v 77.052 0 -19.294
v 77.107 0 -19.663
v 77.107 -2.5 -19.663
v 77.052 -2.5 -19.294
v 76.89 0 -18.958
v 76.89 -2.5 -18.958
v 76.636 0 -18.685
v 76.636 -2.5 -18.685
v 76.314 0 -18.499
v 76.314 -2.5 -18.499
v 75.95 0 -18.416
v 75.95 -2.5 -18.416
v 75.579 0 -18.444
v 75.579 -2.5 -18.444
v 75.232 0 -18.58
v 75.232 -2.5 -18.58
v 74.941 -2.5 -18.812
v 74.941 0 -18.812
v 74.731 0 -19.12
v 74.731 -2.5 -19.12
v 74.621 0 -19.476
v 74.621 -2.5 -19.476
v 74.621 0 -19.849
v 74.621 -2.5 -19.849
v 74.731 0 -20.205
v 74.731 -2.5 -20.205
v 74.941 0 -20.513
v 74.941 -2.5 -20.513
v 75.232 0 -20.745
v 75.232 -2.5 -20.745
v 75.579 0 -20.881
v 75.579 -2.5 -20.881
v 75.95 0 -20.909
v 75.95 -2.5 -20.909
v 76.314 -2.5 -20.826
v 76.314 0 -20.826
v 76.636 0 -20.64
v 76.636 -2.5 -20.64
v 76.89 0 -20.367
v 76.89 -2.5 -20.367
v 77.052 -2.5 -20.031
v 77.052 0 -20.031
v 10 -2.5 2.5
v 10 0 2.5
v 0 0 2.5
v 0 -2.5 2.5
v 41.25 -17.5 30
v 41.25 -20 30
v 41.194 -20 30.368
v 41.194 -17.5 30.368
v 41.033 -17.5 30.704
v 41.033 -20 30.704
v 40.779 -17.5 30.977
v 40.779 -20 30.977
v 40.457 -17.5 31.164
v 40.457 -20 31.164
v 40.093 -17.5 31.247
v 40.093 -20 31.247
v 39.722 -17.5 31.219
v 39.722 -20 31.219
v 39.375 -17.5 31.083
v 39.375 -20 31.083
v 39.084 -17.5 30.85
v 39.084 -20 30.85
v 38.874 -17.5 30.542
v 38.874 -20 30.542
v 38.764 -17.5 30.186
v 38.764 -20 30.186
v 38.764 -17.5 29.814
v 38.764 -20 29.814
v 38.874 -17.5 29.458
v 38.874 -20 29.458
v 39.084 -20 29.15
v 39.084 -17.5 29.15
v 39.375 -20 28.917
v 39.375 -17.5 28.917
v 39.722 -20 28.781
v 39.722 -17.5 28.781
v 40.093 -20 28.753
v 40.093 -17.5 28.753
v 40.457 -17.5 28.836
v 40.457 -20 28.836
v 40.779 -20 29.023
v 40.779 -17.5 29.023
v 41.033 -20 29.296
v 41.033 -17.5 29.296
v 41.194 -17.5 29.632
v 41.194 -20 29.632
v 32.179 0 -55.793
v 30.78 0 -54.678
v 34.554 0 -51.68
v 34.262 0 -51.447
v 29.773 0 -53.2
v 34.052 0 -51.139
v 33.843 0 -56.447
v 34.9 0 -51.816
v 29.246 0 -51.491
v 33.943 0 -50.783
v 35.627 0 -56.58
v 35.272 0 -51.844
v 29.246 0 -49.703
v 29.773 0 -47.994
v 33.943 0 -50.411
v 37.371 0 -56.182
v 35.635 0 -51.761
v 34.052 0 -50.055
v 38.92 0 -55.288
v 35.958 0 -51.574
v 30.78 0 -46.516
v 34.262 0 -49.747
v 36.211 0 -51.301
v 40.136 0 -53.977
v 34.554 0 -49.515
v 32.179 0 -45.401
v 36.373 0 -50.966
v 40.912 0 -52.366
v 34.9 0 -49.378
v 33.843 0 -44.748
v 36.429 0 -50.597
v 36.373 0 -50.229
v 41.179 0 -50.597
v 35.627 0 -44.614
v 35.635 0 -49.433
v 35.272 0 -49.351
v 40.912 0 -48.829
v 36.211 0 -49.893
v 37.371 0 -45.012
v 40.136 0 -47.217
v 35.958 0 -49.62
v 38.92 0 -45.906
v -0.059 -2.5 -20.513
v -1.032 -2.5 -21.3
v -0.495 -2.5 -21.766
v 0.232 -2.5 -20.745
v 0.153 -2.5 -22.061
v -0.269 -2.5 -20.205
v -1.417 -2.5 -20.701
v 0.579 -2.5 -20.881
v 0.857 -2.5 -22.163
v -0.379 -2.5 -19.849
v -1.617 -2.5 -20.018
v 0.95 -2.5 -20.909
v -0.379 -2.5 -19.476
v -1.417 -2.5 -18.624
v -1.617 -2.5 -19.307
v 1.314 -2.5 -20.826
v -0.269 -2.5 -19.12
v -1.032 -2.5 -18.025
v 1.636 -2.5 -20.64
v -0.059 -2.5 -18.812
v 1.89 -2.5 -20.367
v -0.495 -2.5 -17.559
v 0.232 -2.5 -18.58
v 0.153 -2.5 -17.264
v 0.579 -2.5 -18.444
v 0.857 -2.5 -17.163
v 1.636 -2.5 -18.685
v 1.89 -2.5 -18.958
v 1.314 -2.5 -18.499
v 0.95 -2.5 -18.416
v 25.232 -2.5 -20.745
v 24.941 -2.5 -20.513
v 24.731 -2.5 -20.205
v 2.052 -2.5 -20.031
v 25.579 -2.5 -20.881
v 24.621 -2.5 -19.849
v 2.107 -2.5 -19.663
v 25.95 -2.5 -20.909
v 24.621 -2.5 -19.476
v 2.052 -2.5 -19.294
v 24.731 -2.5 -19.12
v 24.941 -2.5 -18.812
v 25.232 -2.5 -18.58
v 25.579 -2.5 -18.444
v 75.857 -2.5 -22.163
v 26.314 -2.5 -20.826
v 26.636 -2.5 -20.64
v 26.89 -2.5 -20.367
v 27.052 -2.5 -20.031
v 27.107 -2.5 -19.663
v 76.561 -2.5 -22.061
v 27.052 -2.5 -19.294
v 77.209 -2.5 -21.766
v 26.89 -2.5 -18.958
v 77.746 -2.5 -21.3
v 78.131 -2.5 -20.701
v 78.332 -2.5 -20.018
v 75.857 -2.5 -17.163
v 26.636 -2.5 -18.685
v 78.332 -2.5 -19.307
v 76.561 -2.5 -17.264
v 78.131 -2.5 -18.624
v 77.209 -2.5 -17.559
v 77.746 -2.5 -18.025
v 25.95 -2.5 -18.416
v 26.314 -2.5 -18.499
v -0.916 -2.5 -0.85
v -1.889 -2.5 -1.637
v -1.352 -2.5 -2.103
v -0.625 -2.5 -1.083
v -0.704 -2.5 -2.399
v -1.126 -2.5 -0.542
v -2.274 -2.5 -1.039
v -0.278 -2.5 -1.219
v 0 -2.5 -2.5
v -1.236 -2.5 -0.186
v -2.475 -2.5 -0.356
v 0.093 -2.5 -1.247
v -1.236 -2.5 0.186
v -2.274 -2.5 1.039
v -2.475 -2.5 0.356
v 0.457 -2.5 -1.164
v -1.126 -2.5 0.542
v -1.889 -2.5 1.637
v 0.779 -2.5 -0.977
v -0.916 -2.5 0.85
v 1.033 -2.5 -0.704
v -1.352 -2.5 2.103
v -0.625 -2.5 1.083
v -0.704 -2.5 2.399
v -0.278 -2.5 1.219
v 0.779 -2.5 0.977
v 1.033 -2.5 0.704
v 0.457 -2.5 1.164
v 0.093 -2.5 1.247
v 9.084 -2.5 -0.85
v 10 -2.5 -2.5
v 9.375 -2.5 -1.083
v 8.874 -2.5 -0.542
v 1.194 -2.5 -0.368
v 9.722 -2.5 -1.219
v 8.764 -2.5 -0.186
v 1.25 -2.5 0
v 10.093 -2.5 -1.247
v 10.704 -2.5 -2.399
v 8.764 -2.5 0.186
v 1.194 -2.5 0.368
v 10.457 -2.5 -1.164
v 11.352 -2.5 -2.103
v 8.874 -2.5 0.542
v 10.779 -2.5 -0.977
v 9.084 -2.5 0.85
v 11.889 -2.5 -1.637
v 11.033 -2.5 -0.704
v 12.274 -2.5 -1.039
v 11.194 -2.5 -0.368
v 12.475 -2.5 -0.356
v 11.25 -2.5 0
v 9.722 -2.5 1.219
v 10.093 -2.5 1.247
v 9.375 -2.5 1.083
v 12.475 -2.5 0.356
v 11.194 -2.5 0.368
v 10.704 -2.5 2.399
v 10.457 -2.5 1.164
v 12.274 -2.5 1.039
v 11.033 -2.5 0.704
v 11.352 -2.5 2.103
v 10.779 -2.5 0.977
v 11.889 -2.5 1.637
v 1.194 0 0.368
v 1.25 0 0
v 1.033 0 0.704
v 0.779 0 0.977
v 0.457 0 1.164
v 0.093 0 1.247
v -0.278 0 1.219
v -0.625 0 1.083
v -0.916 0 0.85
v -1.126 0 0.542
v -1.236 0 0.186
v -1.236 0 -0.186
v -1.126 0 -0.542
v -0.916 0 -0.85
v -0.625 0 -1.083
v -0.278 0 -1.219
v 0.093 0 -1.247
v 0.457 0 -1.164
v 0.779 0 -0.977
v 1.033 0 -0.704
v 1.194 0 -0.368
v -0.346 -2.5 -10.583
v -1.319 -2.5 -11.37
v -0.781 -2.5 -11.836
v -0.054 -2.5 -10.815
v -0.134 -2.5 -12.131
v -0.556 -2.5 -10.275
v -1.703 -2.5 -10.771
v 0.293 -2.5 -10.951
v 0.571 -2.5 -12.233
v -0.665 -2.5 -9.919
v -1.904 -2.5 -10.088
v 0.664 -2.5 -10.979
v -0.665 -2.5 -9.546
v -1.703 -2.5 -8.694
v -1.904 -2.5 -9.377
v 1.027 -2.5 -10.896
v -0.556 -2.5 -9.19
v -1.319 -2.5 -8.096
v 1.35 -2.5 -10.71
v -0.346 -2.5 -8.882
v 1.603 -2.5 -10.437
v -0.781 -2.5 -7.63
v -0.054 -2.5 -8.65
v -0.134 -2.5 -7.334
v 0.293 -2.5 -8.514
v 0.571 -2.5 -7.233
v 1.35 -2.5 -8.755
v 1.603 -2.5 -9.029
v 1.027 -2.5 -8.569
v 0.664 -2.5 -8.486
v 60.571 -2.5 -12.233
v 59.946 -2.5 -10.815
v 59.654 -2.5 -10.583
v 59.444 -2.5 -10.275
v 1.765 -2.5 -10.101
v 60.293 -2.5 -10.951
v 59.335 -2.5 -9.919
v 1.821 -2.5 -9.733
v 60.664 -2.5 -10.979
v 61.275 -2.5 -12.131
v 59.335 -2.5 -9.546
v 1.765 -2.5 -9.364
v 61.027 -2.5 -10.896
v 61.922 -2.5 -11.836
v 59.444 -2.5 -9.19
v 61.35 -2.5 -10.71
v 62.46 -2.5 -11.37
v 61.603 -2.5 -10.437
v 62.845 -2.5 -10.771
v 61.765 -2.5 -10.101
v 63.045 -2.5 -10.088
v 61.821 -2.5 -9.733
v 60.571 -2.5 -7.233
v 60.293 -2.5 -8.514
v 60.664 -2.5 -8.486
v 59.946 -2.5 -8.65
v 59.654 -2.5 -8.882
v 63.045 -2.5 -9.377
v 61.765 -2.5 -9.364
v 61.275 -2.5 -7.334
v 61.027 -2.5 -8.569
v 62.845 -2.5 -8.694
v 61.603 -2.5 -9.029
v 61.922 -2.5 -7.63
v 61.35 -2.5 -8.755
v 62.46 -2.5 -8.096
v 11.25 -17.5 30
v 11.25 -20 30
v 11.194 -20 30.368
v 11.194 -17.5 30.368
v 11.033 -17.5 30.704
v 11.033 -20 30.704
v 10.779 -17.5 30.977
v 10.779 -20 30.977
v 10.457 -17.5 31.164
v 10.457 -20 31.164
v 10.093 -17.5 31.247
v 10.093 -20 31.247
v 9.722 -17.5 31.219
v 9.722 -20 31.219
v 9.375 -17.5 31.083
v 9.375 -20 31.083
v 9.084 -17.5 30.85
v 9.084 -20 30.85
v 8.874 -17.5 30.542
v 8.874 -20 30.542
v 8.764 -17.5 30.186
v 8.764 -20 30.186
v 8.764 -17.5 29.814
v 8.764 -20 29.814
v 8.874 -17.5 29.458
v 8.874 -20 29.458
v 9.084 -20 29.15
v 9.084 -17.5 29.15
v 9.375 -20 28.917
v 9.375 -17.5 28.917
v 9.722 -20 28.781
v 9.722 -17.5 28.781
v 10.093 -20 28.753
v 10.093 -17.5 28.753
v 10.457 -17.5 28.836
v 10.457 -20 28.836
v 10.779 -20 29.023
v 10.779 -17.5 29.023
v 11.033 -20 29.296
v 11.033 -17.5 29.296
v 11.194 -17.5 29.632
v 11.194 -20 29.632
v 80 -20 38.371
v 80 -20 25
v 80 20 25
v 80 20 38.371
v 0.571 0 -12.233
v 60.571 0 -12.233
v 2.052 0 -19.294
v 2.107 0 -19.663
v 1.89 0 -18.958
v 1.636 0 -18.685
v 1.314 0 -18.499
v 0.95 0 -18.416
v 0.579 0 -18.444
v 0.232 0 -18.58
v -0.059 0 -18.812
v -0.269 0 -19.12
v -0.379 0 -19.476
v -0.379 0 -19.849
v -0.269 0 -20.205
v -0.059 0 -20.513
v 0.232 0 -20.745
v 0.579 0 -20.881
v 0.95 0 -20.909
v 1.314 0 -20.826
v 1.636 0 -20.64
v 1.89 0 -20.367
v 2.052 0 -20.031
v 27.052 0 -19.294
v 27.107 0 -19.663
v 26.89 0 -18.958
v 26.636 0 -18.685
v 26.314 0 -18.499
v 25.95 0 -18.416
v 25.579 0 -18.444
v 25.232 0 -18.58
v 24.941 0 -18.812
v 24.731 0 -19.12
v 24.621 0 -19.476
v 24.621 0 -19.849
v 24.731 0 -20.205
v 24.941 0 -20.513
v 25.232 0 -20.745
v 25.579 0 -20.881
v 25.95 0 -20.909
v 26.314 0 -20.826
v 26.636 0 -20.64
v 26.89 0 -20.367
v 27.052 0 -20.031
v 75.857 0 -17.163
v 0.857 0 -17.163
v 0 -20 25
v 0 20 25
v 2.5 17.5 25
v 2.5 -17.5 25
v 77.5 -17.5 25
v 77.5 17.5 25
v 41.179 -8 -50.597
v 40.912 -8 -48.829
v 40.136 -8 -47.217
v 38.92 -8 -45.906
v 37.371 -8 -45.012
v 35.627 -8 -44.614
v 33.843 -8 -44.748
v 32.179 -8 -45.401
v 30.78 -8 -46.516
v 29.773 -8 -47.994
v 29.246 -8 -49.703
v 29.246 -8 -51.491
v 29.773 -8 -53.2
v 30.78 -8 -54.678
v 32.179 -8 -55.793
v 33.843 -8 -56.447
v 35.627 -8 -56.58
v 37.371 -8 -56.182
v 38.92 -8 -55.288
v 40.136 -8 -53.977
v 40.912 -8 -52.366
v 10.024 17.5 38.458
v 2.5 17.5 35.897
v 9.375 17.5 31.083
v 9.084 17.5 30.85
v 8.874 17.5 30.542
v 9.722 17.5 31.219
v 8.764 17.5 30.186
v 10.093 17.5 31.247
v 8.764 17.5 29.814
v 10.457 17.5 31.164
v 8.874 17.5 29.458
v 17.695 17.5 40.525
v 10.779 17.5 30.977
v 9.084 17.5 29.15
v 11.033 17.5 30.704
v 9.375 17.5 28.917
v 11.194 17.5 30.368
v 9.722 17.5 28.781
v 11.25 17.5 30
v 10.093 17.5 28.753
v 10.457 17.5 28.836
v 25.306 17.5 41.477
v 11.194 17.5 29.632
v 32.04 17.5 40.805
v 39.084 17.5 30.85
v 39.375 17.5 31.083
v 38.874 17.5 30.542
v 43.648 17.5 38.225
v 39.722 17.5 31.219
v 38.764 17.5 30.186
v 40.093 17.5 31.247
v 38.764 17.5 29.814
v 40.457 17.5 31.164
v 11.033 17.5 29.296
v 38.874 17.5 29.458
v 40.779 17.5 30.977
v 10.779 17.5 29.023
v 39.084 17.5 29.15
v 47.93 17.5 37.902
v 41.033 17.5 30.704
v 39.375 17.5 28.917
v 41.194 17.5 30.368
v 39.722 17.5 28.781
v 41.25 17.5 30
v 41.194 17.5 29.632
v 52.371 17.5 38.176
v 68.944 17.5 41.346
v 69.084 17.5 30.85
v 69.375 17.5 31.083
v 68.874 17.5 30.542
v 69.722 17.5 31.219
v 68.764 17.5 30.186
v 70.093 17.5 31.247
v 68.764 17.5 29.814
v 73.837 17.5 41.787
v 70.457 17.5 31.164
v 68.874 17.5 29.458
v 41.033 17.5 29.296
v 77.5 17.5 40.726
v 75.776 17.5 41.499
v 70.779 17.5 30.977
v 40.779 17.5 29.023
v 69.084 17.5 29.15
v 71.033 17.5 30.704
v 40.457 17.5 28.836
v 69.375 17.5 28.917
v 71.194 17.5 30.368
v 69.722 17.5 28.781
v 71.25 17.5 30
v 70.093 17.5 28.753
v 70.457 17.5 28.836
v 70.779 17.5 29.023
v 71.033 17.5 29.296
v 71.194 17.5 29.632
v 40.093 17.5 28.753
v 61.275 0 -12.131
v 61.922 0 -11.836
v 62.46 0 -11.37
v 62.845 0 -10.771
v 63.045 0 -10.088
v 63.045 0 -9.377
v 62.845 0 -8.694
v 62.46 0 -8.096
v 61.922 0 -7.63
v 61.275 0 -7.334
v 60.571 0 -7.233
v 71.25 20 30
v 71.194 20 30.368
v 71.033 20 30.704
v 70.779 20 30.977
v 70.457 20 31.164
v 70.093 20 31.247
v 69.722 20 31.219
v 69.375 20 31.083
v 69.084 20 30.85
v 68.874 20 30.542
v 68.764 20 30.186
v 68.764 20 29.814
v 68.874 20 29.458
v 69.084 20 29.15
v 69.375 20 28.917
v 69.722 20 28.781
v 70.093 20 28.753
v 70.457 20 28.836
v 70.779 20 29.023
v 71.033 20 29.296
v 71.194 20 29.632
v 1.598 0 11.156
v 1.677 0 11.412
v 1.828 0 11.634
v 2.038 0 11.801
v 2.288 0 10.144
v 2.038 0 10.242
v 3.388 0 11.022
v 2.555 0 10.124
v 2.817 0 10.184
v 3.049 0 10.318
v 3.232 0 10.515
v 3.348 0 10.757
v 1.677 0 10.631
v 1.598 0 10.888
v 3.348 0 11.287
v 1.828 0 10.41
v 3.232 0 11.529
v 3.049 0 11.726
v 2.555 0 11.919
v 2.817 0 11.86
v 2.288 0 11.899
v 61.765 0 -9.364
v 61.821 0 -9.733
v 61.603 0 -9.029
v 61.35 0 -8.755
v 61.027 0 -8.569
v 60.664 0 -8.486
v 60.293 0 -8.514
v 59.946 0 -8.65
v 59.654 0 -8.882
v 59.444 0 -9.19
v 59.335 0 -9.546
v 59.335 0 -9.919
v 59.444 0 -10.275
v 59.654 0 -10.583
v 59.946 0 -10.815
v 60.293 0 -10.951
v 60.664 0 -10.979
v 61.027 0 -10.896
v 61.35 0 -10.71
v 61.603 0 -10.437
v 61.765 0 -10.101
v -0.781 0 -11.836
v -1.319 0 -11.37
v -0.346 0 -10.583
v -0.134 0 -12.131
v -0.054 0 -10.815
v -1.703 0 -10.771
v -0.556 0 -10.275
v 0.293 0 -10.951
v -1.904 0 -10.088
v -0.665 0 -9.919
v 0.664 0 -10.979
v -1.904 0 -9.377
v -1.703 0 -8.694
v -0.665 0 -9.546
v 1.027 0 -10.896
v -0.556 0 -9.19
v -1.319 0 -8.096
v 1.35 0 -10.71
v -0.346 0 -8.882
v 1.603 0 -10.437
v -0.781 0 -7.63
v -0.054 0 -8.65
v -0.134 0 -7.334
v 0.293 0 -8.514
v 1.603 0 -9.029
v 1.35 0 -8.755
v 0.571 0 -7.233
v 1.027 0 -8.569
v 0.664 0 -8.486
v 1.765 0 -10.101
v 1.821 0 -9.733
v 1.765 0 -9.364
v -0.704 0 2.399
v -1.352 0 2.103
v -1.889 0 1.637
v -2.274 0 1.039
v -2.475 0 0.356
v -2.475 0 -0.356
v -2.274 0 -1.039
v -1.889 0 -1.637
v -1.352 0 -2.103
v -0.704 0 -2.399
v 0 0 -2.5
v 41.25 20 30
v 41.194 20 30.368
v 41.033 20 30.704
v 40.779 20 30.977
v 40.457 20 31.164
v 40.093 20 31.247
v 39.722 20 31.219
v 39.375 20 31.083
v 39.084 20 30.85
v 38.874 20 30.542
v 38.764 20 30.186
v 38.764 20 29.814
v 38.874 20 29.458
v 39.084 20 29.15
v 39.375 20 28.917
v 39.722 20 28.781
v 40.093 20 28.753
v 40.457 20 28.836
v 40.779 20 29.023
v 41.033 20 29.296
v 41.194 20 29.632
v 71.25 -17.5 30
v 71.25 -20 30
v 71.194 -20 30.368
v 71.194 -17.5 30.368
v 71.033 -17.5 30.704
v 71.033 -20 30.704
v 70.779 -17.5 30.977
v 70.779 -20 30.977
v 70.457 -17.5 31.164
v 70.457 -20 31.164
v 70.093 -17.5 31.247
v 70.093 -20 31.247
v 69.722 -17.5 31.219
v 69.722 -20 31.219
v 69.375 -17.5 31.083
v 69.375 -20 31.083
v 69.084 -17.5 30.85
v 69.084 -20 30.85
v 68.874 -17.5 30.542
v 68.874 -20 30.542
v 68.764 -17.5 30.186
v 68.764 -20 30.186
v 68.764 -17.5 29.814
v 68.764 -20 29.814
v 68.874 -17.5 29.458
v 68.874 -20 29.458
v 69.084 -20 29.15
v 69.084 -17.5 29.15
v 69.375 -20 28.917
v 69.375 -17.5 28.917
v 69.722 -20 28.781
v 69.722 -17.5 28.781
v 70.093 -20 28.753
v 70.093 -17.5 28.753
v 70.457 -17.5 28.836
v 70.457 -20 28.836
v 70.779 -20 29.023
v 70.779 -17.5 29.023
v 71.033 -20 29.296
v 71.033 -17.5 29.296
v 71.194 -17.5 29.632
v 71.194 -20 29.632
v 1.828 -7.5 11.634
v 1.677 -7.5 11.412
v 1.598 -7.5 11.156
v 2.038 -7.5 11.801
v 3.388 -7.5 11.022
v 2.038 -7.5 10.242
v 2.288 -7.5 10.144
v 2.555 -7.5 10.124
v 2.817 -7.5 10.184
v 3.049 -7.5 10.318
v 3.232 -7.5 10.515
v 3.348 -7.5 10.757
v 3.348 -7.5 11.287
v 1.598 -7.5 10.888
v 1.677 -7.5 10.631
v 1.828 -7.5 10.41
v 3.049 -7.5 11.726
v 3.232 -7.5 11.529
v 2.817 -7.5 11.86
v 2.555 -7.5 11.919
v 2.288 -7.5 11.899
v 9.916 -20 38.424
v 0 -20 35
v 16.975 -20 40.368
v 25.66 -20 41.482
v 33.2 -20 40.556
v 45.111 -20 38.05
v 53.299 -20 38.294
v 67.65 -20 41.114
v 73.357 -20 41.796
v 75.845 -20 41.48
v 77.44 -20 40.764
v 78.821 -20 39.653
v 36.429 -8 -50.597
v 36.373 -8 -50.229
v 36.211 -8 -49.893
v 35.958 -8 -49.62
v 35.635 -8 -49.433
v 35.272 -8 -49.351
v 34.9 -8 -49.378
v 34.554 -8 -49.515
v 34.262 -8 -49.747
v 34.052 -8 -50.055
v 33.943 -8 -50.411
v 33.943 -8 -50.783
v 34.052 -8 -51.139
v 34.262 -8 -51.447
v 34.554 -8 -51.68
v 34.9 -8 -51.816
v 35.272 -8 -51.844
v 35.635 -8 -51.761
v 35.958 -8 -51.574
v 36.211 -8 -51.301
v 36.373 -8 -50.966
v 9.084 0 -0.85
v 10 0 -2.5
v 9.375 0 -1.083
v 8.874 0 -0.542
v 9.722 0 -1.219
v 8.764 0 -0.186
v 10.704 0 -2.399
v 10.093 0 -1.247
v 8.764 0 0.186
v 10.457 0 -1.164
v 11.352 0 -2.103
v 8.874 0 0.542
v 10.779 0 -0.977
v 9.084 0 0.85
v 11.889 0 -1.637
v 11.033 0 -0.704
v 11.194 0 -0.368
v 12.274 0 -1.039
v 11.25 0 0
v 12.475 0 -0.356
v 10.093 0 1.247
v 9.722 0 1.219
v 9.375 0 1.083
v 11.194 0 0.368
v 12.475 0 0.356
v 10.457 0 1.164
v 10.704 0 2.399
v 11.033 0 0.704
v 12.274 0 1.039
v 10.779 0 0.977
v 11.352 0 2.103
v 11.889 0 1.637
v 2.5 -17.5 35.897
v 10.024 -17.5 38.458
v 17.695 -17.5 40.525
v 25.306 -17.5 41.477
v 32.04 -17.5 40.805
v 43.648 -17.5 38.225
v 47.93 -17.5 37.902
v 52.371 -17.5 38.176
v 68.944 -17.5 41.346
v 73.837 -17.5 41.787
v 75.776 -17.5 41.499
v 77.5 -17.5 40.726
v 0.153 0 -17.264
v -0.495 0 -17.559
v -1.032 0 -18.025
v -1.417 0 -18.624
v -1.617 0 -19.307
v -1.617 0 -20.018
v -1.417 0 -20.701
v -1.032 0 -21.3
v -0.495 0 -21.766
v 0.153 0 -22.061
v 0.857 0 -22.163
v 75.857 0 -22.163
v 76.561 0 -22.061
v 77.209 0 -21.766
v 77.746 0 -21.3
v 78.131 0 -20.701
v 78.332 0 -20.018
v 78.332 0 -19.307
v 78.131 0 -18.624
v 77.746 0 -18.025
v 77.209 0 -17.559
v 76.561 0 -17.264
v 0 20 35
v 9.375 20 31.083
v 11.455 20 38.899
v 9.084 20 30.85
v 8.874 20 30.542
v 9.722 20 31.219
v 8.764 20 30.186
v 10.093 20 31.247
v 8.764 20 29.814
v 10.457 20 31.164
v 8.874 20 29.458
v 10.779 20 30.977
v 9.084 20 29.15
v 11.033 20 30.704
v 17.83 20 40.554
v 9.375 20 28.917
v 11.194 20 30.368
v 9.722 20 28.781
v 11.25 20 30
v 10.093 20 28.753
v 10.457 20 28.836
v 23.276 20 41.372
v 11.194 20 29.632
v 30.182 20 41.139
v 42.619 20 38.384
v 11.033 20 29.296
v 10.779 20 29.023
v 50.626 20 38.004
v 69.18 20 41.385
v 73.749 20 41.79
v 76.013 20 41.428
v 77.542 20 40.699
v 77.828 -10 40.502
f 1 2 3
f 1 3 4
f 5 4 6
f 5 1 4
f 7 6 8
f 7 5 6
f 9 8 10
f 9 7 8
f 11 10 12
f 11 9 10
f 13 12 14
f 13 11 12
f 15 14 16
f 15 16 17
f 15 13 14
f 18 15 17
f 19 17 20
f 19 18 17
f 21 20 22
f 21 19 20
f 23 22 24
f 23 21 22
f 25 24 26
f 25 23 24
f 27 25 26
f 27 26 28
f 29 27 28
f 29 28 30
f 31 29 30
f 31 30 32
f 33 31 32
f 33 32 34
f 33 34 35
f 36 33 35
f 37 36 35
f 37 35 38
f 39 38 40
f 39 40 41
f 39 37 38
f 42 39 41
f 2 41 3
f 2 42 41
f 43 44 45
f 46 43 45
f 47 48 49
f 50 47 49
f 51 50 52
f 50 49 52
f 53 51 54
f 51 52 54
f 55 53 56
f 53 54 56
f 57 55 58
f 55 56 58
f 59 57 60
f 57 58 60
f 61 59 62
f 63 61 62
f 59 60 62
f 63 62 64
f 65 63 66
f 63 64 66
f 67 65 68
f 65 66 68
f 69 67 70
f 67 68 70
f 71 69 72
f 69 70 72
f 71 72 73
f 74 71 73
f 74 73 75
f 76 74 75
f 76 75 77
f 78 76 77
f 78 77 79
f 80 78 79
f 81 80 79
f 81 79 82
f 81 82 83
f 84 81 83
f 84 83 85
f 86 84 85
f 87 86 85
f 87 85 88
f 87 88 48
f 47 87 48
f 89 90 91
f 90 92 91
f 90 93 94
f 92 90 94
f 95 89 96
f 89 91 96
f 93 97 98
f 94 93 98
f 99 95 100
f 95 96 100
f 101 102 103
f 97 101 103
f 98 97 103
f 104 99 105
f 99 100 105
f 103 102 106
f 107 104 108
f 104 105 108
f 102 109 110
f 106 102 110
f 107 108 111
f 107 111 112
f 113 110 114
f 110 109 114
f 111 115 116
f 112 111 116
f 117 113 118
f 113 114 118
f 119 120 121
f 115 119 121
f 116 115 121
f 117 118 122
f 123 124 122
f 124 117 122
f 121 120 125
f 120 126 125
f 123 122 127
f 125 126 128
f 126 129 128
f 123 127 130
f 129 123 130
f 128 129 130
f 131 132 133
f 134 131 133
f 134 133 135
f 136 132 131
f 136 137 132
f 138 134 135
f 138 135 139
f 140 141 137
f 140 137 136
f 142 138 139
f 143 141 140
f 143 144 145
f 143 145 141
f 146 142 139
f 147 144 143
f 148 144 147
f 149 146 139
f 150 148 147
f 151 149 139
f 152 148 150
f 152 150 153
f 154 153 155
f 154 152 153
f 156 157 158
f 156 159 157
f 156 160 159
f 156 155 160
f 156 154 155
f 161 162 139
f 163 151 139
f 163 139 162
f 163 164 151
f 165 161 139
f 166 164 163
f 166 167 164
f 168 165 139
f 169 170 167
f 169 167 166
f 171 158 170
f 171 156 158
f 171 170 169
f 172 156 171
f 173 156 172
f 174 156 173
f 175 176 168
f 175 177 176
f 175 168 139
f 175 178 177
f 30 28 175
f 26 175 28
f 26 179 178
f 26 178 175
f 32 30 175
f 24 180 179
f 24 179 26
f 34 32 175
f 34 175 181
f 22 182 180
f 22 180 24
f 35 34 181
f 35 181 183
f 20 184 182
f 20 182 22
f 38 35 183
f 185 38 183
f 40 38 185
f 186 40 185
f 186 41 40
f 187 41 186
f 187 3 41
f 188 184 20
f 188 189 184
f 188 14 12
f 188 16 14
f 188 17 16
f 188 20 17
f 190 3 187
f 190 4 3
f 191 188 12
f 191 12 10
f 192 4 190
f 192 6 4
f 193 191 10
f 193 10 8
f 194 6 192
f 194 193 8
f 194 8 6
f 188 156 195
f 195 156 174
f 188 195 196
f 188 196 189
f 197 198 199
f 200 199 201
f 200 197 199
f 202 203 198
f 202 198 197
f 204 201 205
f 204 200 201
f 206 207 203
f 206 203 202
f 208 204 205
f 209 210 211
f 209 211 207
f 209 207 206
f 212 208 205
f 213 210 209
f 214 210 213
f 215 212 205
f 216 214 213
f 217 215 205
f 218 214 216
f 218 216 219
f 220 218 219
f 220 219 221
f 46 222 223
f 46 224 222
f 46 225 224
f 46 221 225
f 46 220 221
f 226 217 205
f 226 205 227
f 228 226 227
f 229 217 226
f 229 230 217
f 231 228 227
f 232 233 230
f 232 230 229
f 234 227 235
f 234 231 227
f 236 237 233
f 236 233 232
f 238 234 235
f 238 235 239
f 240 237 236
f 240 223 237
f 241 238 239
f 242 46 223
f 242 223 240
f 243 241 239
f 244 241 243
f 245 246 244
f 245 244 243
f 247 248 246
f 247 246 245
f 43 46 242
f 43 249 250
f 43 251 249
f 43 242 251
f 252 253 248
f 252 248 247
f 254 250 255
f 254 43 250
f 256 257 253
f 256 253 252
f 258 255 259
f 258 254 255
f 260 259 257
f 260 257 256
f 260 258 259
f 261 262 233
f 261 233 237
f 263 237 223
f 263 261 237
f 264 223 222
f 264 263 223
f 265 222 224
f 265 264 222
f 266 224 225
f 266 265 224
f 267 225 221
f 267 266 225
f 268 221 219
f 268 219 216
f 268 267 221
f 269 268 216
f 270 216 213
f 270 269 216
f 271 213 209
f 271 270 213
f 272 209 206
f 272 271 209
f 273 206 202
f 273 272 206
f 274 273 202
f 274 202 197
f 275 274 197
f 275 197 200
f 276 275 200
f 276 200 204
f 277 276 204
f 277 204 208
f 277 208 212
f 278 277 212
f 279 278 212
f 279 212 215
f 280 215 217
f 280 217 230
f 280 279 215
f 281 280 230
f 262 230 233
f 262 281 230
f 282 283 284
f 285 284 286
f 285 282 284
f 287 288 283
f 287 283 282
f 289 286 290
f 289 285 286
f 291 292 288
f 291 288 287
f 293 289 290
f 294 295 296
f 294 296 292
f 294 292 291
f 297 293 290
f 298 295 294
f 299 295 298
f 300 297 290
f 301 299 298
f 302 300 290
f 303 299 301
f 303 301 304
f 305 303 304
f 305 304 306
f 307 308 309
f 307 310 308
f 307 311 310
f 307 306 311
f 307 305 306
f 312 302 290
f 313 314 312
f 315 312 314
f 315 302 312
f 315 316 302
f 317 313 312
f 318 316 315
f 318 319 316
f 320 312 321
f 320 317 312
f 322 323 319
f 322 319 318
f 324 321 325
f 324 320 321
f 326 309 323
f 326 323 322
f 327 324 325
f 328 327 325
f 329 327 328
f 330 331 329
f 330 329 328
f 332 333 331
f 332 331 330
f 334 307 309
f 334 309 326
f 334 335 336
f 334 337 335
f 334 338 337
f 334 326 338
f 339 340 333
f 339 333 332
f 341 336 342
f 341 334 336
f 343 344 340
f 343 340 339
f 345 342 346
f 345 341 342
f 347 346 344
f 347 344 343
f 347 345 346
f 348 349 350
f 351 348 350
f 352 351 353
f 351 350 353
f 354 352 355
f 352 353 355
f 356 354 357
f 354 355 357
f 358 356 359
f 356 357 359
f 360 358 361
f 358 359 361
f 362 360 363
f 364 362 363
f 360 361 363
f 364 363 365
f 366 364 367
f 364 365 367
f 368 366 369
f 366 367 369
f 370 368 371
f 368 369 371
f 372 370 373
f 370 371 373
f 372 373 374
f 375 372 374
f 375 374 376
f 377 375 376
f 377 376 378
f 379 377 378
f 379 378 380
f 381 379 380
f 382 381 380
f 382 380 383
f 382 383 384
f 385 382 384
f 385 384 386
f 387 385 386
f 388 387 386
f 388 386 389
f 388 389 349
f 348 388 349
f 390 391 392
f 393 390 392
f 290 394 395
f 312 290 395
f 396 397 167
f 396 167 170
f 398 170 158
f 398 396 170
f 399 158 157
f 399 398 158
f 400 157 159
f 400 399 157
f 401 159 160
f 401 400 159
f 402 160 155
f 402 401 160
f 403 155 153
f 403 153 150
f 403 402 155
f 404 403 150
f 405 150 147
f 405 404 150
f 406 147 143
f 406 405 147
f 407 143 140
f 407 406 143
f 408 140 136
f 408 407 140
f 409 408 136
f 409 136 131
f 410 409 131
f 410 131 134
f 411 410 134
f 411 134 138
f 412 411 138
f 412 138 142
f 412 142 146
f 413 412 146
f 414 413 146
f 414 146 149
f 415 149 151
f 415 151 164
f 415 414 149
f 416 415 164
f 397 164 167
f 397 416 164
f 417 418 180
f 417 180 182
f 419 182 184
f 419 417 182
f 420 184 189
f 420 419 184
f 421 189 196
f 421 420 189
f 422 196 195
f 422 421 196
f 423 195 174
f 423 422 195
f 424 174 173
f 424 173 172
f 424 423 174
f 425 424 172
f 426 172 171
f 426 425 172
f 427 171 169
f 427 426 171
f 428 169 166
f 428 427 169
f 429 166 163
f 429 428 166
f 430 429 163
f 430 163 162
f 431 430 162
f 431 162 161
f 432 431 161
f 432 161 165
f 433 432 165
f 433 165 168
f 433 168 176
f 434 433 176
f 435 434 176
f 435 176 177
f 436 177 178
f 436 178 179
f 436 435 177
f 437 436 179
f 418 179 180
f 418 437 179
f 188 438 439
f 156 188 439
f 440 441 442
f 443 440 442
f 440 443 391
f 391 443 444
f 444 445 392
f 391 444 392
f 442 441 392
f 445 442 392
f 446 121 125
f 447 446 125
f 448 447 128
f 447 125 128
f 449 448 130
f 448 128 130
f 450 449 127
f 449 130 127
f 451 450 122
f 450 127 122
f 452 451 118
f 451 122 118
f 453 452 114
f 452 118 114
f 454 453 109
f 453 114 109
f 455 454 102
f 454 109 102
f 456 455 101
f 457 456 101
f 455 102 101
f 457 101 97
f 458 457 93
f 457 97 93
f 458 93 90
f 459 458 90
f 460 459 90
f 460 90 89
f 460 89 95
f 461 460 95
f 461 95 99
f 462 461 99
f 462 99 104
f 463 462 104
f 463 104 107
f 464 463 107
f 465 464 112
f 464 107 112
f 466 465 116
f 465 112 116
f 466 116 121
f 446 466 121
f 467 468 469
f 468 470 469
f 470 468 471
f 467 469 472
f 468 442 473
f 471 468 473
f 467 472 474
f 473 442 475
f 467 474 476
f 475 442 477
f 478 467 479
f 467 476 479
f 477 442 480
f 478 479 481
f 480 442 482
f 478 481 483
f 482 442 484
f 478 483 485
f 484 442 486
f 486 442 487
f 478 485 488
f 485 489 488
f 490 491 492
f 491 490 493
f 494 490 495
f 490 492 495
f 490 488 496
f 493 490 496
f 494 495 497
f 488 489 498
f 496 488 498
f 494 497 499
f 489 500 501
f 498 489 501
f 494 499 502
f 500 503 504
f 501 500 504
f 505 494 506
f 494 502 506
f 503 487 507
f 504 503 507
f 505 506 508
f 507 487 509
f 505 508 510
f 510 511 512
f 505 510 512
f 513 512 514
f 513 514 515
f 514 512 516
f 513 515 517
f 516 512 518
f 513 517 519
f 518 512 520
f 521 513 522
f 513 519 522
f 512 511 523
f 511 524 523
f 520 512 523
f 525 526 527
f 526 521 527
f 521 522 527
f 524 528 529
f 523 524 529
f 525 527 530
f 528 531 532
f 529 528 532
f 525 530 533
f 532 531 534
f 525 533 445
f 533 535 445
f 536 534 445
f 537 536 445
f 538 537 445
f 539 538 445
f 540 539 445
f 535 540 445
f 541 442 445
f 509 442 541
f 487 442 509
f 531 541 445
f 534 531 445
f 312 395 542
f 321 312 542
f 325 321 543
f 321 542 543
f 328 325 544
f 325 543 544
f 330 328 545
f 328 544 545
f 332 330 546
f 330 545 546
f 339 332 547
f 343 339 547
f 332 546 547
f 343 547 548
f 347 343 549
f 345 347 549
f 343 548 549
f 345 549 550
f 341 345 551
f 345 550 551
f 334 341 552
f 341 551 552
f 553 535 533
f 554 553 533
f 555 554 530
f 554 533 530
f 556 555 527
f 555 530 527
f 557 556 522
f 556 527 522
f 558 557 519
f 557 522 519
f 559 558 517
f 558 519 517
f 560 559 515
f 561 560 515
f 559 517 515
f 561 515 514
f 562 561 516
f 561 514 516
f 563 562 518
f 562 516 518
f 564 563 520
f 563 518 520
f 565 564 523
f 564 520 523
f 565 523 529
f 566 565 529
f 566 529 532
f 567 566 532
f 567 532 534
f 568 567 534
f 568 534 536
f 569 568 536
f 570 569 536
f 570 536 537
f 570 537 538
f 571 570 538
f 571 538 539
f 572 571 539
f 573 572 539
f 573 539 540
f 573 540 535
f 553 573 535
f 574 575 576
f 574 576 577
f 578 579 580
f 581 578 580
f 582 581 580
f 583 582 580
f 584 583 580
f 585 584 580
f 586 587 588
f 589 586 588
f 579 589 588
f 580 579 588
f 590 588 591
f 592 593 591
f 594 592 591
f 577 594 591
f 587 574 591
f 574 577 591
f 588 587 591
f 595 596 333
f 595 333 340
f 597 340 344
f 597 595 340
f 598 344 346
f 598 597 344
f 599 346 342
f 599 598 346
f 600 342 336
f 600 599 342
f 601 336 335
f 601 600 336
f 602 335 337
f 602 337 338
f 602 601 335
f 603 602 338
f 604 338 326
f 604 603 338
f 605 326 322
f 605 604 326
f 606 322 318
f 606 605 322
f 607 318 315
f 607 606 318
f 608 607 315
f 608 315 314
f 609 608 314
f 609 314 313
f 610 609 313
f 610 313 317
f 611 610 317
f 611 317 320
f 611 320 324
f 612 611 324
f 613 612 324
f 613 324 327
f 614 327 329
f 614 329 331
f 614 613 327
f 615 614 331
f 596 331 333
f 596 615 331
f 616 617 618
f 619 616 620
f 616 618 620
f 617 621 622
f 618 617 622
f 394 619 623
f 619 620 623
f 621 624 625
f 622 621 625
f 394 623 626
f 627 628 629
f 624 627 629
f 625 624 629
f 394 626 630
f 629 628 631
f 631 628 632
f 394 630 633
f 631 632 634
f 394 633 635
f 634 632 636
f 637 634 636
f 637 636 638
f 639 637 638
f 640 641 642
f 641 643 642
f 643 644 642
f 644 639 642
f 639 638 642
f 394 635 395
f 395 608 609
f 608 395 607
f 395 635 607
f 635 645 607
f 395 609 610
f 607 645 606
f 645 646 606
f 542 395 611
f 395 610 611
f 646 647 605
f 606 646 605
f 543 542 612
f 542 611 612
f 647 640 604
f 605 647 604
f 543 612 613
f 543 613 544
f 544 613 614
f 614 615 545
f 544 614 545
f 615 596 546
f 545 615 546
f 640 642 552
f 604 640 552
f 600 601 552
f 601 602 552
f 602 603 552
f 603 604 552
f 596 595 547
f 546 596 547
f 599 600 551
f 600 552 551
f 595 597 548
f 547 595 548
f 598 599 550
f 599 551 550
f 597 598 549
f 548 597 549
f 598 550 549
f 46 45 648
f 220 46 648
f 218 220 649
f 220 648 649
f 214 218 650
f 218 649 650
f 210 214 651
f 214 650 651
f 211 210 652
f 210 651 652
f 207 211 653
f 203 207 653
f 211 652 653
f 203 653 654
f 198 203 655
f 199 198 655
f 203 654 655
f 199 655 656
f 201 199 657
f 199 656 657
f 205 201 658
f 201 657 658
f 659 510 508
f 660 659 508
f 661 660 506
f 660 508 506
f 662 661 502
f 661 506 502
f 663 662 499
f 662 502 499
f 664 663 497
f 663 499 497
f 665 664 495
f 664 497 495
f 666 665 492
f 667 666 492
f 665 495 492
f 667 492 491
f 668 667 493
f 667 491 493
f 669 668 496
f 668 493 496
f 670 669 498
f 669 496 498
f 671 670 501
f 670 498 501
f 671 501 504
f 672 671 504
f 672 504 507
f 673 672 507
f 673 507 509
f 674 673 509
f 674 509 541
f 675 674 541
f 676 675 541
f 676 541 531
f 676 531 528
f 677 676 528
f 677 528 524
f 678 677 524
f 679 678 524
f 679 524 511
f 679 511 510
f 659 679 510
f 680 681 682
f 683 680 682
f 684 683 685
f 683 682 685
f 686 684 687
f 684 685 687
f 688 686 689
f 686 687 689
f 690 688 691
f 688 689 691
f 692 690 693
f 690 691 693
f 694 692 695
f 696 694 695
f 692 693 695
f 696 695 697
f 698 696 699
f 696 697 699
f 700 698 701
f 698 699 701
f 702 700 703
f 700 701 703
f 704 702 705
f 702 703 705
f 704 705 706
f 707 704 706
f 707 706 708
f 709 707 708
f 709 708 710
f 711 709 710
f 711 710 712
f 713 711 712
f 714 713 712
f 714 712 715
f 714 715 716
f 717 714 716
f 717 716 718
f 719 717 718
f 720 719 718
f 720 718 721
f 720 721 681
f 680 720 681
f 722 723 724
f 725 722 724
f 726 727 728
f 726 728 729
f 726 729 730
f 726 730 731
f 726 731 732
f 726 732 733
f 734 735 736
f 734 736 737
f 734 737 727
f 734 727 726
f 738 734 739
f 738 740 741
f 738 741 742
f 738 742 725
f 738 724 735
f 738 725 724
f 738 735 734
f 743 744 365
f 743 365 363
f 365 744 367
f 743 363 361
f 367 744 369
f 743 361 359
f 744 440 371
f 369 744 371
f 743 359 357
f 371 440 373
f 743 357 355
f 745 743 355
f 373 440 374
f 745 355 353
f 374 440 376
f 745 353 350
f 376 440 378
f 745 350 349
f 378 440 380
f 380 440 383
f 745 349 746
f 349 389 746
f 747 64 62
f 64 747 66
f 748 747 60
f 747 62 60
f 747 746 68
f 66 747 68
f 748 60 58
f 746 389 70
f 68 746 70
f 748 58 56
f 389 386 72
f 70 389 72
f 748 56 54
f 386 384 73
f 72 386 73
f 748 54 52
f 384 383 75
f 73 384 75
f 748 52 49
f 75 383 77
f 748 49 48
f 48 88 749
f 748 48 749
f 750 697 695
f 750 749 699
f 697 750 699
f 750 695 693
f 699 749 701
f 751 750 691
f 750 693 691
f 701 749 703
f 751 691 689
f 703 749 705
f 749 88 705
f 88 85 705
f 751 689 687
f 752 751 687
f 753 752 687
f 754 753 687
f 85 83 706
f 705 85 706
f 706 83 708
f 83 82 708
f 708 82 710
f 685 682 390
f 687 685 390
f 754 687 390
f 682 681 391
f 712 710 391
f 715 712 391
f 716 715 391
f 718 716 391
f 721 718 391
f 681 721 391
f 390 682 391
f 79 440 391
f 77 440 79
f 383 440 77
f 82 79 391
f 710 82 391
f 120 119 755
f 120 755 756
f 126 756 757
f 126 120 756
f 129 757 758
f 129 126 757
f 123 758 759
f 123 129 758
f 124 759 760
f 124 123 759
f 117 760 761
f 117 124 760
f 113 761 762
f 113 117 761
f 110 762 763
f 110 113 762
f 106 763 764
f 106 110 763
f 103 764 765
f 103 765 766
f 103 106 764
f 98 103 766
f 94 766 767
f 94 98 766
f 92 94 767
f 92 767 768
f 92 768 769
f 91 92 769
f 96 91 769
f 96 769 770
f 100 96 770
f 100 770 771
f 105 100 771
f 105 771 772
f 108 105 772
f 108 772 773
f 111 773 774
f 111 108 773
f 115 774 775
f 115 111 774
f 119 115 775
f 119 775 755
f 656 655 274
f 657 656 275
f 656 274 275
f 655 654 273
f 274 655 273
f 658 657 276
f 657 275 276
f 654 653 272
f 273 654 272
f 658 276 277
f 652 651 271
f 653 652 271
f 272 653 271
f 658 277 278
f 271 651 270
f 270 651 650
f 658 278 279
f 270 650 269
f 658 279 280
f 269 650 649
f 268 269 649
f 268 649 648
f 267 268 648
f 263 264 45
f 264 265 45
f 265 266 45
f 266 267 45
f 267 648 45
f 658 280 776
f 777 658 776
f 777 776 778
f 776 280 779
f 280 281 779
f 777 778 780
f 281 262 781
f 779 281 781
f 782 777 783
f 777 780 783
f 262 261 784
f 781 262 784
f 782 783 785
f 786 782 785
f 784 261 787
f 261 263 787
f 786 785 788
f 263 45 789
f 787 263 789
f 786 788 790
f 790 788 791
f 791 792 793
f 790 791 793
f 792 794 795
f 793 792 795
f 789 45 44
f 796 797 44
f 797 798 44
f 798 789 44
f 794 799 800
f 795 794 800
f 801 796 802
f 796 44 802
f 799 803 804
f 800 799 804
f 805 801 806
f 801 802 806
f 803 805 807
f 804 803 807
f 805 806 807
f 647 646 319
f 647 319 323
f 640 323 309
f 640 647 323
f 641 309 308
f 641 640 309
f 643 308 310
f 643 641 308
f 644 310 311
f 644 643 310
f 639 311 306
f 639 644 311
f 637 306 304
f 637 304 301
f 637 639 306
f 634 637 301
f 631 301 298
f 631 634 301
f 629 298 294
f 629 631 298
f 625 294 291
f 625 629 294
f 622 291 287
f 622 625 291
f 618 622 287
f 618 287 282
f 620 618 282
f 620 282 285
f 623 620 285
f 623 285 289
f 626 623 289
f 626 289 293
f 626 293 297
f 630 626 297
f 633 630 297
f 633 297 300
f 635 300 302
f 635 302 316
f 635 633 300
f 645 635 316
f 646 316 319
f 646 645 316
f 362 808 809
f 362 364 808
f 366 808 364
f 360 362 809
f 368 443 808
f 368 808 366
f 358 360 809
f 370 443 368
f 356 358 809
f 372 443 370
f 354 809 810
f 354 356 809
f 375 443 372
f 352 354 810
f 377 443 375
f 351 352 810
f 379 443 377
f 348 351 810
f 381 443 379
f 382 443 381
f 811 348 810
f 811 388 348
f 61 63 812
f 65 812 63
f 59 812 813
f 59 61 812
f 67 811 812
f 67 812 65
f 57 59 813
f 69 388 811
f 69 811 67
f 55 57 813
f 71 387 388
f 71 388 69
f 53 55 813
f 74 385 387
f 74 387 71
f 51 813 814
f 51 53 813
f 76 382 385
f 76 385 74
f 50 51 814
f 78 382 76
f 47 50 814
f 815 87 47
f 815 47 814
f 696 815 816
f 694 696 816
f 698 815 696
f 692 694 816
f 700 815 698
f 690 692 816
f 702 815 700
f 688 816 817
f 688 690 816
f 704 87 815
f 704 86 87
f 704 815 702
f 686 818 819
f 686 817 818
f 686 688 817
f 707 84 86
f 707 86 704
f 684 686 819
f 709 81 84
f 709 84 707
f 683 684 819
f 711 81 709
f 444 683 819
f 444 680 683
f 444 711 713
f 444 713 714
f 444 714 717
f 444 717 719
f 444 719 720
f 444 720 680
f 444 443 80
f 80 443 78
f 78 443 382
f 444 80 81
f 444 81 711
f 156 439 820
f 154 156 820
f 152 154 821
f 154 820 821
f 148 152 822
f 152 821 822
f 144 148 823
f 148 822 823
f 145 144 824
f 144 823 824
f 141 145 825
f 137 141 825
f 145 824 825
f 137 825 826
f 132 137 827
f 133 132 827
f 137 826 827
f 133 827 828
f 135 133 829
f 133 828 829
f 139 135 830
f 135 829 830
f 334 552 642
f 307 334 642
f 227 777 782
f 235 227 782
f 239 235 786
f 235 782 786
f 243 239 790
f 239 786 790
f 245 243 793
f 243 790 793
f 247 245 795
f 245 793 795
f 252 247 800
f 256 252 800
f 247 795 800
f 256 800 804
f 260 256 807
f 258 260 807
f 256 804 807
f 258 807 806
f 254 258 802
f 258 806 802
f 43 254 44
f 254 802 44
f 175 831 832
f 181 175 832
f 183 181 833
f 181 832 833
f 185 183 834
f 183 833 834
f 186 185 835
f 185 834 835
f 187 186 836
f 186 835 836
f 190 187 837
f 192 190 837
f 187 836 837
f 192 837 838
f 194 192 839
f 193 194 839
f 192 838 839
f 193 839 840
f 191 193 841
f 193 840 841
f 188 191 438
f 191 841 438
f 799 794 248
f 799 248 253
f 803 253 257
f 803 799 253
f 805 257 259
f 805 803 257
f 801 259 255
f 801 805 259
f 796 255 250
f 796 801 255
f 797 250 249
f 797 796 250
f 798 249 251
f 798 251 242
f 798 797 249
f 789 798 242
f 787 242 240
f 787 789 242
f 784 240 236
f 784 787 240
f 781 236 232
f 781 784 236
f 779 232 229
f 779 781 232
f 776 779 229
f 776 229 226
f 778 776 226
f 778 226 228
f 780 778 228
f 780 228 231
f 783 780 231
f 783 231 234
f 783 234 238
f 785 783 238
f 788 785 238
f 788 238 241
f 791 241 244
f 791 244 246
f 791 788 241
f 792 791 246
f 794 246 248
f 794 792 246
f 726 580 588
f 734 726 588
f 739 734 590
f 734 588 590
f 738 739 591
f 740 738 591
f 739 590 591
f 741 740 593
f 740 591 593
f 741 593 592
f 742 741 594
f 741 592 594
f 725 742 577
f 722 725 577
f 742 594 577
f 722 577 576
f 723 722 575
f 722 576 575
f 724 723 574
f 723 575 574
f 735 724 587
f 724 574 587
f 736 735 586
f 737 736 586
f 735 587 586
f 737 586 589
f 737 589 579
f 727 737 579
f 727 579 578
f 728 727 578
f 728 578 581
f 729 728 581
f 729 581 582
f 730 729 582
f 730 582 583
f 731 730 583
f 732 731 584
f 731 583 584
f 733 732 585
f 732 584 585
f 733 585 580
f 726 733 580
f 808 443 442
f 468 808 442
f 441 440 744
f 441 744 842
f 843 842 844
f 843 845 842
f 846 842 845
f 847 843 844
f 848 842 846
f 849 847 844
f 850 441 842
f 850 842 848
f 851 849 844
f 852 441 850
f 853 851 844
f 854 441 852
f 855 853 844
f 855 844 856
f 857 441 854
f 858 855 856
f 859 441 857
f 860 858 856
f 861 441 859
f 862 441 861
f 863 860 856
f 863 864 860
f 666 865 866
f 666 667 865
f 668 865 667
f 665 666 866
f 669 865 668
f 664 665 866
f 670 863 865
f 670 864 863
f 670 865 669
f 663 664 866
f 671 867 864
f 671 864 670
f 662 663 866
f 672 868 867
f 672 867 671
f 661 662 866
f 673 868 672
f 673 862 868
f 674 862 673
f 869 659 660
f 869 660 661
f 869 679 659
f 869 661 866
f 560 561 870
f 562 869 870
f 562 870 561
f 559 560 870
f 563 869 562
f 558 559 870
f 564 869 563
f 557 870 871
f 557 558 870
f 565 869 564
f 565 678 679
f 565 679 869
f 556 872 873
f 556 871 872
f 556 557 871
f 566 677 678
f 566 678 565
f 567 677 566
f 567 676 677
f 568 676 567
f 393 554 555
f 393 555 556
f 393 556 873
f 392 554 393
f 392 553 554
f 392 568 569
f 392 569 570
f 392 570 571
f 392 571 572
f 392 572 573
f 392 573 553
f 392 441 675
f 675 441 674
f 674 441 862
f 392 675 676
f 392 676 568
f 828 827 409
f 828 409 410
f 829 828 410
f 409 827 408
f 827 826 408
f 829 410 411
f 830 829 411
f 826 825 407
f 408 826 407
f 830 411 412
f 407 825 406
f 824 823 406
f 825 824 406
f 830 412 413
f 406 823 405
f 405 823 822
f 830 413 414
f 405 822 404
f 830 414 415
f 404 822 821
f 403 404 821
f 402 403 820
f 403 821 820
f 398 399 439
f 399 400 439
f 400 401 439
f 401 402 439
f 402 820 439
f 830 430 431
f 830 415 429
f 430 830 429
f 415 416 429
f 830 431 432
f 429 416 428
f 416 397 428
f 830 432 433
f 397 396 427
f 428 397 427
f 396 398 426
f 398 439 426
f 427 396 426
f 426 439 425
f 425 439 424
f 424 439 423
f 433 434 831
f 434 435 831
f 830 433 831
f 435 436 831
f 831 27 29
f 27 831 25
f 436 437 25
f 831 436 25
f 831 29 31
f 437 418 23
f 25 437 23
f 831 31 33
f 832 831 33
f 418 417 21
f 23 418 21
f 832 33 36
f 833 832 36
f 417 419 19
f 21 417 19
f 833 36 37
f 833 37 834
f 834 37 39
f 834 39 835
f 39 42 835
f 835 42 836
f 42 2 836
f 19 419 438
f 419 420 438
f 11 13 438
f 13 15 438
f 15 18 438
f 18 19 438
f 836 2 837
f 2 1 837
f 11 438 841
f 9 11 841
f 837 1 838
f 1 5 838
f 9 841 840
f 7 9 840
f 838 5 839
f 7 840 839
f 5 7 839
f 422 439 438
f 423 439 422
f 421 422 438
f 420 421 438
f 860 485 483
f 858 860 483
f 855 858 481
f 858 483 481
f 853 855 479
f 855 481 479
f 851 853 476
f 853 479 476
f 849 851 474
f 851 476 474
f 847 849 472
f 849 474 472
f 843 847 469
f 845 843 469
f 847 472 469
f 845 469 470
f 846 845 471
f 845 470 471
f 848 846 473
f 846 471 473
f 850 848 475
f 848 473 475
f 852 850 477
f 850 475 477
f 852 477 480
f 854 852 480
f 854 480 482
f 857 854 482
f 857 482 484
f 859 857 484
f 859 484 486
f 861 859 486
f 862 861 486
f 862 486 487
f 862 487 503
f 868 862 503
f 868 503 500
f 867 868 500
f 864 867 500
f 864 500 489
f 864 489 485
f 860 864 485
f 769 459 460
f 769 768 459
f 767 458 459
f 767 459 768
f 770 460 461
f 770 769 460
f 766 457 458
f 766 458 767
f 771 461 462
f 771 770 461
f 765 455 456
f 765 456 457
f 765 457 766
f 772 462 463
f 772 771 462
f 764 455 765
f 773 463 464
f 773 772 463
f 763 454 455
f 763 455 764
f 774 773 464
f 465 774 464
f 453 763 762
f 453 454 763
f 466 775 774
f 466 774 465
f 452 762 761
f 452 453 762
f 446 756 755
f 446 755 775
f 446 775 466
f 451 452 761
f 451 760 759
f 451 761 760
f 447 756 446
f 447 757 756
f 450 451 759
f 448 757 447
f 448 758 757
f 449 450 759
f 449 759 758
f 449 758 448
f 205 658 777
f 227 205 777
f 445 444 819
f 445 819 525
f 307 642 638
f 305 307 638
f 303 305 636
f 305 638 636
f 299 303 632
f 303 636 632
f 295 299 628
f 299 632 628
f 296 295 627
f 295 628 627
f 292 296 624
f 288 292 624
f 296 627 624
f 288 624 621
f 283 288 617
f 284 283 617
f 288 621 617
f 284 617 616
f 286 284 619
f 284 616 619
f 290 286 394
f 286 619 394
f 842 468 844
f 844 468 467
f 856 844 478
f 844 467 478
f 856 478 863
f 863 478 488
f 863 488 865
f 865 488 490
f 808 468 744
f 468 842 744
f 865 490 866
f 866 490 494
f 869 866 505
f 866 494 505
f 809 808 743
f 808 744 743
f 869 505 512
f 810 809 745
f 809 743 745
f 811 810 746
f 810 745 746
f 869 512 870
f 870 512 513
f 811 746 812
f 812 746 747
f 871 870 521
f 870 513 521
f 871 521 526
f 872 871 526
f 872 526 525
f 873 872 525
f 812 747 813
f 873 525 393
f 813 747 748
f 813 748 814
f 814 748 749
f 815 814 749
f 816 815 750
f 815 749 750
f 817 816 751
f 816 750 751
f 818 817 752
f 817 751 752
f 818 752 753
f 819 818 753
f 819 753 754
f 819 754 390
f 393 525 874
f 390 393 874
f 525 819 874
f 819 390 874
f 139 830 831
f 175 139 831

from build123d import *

# Parameters (mm, degrees)
F1_R      = 1.25
F2_DEPTH  = 2.5
F3_R      = 1.25
F4_DEPTH  = 2.5
F5_R      = 1.25
F6_DEPTH  = 2.5
F8_W      = 80
F8_H      = 40
F8_W_2    = 75
F8_H_2    = 35
F9_DEPTH  = 20
F10_R     = 1.25
F11_DEPTH = 40.001
F12_R     = 0.9
F13_DEPTH = 7.5
F15_DEPTH = 40.001
F16_R     = 6
F16_R_2   = 1.25
F17_DEPTH = 8


with BuildPart() as f2:
    # F1 (on Front) → F2 (new body)
    with BuildSketch(Plane.XZ):
        with BuildLine():
            Line((10, 2.5), (0, 2.5))
            ThreePointArc((0, 2.5), (-2.5, 0), (0, -2.5))
            Line((0, -2.5), (10, -2.5))
            ThreePointArc((10, -2.5), (12.5, 0), (10, 2.5))
        make_face()
        Circle(F1_R, mode=Mode.SUBTRACT)
        with Locations((10, 0)):
            Circle(F1_R, mode=Mode.SUBTRACT)
    extrude(amount=F2_DEPTH)


with BuildPart() as f4:
    # F3 (on Front) → F4 (new body)
    with BuildSketch(Plane.XZ):
        with BuildLine():
            Line((60.5706622079, -7.232673876), (0.5706622079, -7.232673876))
            ThreePointArc((0.5706622079, -7.232673876), (-1.9293377921, -9.732673876), (0.5706622079, -12.232673876))
            Line((0.5706622079, -12.232673876), (60.5706622079, -12.232673876))
            ThreePointArc((60.5706622079, -12.232673876), (63.0706622079, -9.732673876), (60.5706622079, -7.232673876))
        make_face()
        with Locations((0.5706622079, -9.732673876)):
            Circle(F3_R, mode=Mode.SUBTRACT)
        with Locations((60.5706622079, -9.732673876)):
            Circle(F3_R, mode=Mode.SUBTRACT)
    extrude(amount=F4_DEPTH)


with BuildPart() as f6:
    # F5 (on Front) → F6 (new body)
    with BuildSketch(Plane.XZ):
        with BuildLine():
            Line((75.8570737601, -17.1626018733), (0.8570737601, -17.1626018733))
            ThreePointArc((0.8570737601, -17.1626018733), (-1.6429262399, -19.6626018733), (0.8570737601, -22.1626018733))
            Line((0.8570737601, -22.1626018733), (75.8570737601, -22.1626018733))
            ThreePointArc((75.8570737601, -22.1626018733), (78.3570737601, -19.6626018733), (75.8570737601, -17.1626018733))
        make_face()
        with Locations((0.8570737601, -19.6626018733)):
            Circle(F5_R, mode=Mode.SUBTRACT)
        with Locations((25.8570737601, -19.6626018733)):
            Circle(F5_R, mode=Mode.SUBTRACT)
        with Locations((75.8570737601, -19.6626018733)):
            Circle(F5_R, mode=Mode.SUBTRACT)
    extrude(amount=F6_DEPTH)


with BuildPart() as f9:
    # F8 (on offset) → F9 (new body)
    with BuildSketch(Plane.XY.offset(25)):
        with Locations((40, 0)):
            Rectangle(F8_W, F8_H)
        with Locations((40, 0)):
            Rectangle(F8_W_2, F8_H_2, mode=Mode.SUBTRACT)
    extrude(amount=F9_DEPTH)

    # F10 (on face) → F11 (cut, through all)
    with BuildSketch(Plane.XZ.offset(20)):
        with Locations((10, 30)):
            Circle(F10_R)
        with Locations((70, 30)):
            Circle(F10_R)
        with Locations((40, 30)):
            Circle(F10_R)
    extrude(amount=-F11_DEPTH, mode=Mode.SUBTRACT)

    # F14 (on face) → F15 (cut, through all)
    with BuildSketch(Plane.XZ.offset(20)):
        with BuildLine():
            Line((-10.1319709793, 49.101550132), (0, 35))
            add(Edge.make_bspline(
                [(0, 35), (9.529848485, 38.4259781723), (27.4495666781, 44.8681124286), (47.1159441406, 34.1178456935), (74.6396223756, 44.5048404906), (78.6707572882, 39.8923398991), (80, 38.3713953197)],
                knots=[0, 0, 0, 0, 0.300472275, 0.5650014794, 0.8565618304, 1, 1, 1, 1], degree=3))
            Line((80, 38.3713953197), (95.8632975817, 42.5701513886))
            Line((95.8632975817, 42.5701513886), (68.1515038013, 61.1379854381))
            Line((68.1515038013, 61.1379854381), (-10.1319709793, 49.101550132))
        make_face()
    extrude(amount=-F15_DEPTH, mode=Mode.SUBTRACT)


with BuildPart() as f13:
    # F12 (on Front) → F13 (new body)
    with BuildSketch(Plane.XZ):
        with Locations((2.488047583, 11.0218990594)):
            Circle(F12_R)
    extrude(amount=F13_DEPTH)


with BuildPart() as f17:
    # F16 (on Front) → F17 (new body)
    with BuildSketch(Plane.XZ):
        with Locations((35.1786203682, -50.5970679224)):
            Circle(F16_R)
        with Locations((35.1786203682, -50.5970679224)):
            Circle(F16_R_2, mode=Mode.SUBTRACT)
    extrude(amount=F17_DEPTH)


solid = Compound([f2.part, f4.part, f6.part, f9.part, f13.part, f17.part])
